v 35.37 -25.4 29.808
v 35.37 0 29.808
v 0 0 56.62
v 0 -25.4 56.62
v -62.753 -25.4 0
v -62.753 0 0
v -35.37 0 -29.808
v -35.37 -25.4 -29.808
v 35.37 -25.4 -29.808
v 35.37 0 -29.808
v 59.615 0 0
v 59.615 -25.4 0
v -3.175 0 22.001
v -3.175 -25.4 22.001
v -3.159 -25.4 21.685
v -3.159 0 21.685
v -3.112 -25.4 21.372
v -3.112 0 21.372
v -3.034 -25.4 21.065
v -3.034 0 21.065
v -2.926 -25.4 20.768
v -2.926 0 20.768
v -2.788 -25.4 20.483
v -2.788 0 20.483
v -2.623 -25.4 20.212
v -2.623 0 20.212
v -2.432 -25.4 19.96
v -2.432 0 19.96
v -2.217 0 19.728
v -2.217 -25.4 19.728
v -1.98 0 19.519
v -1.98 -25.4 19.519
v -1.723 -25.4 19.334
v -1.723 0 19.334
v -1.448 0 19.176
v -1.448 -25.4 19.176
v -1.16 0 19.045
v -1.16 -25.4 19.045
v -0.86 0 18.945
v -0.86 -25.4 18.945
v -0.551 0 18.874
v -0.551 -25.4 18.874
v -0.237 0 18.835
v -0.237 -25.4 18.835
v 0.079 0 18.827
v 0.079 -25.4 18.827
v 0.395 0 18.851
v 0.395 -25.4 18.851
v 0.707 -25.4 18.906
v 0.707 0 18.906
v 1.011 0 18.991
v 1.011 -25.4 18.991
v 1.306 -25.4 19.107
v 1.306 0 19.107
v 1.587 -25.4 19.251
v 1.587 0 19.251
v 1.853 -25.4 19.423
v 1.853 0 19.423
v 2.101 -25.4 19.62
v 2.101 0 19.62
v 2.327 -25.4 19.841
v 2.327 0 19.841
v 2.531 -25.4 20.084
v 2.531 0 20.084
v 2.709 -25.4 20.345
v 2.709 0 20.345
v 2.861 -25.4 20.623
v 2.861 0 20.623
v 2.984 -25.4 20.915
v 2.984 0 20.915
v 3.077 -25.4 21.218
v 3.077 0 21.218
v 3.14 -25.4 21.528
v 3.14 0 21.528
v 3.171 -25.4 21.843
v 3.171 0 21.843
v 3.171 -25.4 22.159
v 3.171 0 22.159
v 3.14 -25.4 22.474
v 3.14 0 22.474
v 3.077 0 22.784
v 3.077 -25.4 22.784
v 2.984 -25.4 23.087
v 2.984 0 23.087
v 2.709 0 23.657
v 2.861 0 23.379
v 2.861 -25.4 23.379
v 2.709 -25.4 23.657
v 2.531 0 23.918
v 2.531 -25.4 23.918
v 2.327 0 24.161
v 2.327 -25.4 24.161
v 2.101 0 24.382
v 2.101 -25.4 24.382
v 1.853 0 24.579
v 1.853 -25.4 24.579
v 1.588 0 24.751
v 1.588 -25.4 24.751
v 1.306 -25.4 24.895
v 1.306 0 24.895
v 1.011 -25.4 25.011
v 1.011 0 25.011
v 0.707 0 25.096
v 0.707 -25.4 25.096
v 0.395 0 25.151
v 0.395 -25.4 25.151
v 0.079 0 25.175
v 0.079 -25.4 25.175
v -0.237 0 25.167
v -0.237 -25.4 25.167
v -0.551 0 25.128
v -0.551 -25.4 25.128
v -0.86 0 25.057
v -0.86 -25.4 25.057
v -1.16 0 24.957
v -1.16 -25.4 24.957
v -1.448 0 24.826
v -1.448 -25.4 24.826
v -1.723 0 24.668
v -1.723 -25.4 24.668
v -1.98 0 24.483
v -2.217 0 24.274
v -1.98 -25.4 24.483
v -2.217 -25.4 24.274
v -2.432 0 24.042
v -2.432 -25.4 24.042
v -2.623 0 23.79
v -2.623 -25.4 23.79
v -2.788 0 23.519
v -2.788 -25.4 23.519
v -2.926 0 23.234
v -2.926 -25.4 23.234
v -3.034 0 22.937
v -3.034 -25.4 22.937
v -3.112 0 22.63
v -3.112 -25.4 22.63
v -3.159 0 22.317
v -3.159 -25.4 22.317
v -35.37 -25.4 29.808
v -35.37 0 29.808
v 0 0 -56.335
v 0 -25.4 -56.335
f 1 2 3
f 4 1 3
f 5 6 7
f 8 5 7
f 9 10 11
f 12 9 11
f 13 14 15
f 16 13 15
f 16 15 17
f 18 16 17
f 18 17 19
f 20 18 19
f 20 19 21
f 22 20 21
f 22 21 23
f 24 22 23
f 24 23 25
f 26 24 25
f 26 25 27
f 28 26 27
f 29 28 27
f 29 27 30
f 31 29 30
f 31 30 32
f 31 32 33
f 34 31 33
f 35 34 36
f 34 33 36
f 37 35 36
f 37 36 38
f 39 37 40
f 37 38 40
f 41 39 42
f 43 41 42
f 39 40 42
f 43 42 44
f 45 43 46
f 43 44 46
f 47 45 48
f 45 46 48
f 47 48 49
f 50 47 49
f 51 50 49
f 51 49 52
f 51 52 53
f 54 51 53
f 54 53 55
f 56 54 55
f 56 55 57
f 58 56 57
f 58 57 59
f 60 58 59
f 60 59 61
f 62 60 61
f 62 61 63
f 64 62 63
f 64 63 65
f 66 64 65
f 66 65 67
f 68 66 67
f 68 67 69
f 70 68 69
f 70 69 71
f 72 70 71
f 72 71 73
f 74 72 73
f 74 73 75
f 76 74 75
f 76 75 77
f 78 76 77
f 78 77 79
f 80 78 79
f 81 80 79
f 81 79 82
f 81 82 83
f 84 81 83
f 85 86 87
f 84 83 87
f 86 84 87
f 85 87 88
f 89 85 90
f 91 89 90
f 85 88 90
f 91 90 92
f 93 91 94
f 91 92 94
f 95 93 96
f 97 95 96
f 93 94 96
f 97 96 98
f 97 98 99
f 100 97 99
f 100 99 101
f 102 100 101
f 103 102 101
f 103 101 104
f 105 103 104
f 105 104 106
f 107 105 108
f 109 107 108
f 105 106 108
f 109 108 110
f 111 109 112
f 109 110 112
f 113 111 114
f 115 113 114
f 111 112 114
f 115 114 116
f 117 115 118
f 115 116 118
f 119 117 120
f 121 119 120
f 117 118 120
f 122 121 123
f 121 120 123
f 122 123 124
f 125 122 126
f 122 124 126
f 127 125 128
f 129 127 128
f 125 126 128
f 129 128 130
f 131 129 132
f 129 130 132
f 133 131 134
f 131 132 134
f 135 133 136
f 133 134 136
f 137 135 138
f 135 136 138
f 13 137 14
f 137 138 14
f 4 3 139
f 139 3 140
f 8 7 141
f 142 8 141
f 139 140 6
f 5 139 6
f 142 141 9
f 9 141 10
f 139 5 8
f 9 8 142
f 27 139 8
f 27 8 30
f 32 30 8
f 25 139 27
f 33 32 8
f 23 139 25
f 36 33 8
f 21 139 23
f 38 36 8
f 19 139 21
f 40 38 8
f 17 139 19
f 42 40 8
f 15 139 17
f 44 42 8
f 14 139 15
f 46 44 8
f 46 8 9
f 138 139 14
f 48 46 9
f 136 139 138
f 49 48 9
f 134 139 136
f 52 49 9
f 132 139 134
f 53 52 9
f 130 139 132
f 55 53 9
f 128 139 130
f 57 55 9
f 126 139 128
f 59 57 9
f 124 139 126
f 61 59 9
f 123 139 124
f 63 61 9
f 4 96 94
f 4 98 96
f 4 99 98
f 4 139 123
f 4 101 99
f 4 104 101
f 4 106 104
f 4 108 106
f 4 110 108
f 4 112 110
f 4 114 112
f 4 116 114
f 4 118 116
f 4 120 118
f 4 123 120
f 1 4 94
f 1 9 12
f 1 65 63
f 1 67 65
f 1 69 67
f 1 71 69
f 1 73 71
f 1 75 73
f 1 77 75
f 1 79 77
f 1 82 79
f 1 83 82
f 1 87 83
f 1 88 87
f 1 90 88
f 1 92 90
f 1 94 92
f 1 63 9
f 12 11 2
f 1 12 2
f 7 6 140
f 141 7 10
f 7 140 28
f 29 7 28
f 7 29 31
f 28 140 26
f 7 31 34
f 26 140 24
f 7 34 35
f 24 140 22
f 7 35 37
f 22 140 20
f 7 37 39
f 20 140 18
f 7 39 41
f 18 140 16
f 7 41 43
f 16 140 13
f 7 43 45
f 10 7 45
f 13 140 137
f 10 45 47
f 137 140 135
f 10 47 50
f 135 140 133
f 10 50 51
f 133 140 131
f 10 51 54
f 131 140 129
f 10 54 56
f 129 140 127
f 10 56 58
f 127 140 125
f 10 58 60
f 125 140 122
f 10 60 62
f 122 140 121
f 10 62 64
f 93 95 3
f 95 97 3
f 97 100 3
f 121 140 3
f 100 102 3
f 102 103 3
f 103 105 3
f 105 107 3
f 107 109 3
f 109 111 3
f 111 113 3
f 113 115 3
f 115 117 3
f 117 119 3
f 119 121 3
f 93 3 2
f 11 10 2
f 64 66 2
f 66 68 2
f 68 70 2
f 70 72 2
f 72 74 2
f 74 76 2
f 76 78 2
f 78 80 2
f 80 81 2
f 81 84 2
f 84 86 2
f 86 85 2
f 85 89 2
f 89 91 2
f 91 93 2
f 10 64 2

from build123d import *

# Parameters (mm, degrees)
F0_W     = 70.7396790385
F0_H     = 59.6152953804
F1_DEPTH = 25.4
F2_R     = 16.4409735045
F3_DEPTH = 25.4
F5_D     = 6.35


with BuildPart() as f1:
    # F0 (on Front) → F1 (new body)
    with BuildSketch(Plane.XZ):
        Polygon((0, 56.6202700138), (-35.3698395193, 29.8076476902), (35.3698395193, 29.8076476902), align=None)
        Rectangle(F0_W, F0_H)
        Polygon((-35.3698395193, -29.8076476902), (-35.3698395193, 29.8076476902), (-62.7529397607, 0), align=None)
        Polygon((59.6152916551, 0), (35.3698395193, 29.8076476902), (35.3698395193, -29.8076476902), align=None)
        Polygon((35.3698395193, -29.8076476902), (-35.3698395193, -29.8076476902), (0, -56.3350282609), align=None)
    extrude(amount=F1_DEPTH)

    # F2 (on Front) → F3 (join)
    with BuildSketch(Plane.XZ):
        Circle(F2_R)
    extrude(amount=F3_DEPTH)

    # F5 (through all)
    with Locations(Plane(origin=(0, 0, 0), x_dir=(1, 0, 0), z_dir=(0, 1, 0))):
        with Locations((0, -22.0009903873)):
            Hole(F5_D / 2)


solid = f1.part
